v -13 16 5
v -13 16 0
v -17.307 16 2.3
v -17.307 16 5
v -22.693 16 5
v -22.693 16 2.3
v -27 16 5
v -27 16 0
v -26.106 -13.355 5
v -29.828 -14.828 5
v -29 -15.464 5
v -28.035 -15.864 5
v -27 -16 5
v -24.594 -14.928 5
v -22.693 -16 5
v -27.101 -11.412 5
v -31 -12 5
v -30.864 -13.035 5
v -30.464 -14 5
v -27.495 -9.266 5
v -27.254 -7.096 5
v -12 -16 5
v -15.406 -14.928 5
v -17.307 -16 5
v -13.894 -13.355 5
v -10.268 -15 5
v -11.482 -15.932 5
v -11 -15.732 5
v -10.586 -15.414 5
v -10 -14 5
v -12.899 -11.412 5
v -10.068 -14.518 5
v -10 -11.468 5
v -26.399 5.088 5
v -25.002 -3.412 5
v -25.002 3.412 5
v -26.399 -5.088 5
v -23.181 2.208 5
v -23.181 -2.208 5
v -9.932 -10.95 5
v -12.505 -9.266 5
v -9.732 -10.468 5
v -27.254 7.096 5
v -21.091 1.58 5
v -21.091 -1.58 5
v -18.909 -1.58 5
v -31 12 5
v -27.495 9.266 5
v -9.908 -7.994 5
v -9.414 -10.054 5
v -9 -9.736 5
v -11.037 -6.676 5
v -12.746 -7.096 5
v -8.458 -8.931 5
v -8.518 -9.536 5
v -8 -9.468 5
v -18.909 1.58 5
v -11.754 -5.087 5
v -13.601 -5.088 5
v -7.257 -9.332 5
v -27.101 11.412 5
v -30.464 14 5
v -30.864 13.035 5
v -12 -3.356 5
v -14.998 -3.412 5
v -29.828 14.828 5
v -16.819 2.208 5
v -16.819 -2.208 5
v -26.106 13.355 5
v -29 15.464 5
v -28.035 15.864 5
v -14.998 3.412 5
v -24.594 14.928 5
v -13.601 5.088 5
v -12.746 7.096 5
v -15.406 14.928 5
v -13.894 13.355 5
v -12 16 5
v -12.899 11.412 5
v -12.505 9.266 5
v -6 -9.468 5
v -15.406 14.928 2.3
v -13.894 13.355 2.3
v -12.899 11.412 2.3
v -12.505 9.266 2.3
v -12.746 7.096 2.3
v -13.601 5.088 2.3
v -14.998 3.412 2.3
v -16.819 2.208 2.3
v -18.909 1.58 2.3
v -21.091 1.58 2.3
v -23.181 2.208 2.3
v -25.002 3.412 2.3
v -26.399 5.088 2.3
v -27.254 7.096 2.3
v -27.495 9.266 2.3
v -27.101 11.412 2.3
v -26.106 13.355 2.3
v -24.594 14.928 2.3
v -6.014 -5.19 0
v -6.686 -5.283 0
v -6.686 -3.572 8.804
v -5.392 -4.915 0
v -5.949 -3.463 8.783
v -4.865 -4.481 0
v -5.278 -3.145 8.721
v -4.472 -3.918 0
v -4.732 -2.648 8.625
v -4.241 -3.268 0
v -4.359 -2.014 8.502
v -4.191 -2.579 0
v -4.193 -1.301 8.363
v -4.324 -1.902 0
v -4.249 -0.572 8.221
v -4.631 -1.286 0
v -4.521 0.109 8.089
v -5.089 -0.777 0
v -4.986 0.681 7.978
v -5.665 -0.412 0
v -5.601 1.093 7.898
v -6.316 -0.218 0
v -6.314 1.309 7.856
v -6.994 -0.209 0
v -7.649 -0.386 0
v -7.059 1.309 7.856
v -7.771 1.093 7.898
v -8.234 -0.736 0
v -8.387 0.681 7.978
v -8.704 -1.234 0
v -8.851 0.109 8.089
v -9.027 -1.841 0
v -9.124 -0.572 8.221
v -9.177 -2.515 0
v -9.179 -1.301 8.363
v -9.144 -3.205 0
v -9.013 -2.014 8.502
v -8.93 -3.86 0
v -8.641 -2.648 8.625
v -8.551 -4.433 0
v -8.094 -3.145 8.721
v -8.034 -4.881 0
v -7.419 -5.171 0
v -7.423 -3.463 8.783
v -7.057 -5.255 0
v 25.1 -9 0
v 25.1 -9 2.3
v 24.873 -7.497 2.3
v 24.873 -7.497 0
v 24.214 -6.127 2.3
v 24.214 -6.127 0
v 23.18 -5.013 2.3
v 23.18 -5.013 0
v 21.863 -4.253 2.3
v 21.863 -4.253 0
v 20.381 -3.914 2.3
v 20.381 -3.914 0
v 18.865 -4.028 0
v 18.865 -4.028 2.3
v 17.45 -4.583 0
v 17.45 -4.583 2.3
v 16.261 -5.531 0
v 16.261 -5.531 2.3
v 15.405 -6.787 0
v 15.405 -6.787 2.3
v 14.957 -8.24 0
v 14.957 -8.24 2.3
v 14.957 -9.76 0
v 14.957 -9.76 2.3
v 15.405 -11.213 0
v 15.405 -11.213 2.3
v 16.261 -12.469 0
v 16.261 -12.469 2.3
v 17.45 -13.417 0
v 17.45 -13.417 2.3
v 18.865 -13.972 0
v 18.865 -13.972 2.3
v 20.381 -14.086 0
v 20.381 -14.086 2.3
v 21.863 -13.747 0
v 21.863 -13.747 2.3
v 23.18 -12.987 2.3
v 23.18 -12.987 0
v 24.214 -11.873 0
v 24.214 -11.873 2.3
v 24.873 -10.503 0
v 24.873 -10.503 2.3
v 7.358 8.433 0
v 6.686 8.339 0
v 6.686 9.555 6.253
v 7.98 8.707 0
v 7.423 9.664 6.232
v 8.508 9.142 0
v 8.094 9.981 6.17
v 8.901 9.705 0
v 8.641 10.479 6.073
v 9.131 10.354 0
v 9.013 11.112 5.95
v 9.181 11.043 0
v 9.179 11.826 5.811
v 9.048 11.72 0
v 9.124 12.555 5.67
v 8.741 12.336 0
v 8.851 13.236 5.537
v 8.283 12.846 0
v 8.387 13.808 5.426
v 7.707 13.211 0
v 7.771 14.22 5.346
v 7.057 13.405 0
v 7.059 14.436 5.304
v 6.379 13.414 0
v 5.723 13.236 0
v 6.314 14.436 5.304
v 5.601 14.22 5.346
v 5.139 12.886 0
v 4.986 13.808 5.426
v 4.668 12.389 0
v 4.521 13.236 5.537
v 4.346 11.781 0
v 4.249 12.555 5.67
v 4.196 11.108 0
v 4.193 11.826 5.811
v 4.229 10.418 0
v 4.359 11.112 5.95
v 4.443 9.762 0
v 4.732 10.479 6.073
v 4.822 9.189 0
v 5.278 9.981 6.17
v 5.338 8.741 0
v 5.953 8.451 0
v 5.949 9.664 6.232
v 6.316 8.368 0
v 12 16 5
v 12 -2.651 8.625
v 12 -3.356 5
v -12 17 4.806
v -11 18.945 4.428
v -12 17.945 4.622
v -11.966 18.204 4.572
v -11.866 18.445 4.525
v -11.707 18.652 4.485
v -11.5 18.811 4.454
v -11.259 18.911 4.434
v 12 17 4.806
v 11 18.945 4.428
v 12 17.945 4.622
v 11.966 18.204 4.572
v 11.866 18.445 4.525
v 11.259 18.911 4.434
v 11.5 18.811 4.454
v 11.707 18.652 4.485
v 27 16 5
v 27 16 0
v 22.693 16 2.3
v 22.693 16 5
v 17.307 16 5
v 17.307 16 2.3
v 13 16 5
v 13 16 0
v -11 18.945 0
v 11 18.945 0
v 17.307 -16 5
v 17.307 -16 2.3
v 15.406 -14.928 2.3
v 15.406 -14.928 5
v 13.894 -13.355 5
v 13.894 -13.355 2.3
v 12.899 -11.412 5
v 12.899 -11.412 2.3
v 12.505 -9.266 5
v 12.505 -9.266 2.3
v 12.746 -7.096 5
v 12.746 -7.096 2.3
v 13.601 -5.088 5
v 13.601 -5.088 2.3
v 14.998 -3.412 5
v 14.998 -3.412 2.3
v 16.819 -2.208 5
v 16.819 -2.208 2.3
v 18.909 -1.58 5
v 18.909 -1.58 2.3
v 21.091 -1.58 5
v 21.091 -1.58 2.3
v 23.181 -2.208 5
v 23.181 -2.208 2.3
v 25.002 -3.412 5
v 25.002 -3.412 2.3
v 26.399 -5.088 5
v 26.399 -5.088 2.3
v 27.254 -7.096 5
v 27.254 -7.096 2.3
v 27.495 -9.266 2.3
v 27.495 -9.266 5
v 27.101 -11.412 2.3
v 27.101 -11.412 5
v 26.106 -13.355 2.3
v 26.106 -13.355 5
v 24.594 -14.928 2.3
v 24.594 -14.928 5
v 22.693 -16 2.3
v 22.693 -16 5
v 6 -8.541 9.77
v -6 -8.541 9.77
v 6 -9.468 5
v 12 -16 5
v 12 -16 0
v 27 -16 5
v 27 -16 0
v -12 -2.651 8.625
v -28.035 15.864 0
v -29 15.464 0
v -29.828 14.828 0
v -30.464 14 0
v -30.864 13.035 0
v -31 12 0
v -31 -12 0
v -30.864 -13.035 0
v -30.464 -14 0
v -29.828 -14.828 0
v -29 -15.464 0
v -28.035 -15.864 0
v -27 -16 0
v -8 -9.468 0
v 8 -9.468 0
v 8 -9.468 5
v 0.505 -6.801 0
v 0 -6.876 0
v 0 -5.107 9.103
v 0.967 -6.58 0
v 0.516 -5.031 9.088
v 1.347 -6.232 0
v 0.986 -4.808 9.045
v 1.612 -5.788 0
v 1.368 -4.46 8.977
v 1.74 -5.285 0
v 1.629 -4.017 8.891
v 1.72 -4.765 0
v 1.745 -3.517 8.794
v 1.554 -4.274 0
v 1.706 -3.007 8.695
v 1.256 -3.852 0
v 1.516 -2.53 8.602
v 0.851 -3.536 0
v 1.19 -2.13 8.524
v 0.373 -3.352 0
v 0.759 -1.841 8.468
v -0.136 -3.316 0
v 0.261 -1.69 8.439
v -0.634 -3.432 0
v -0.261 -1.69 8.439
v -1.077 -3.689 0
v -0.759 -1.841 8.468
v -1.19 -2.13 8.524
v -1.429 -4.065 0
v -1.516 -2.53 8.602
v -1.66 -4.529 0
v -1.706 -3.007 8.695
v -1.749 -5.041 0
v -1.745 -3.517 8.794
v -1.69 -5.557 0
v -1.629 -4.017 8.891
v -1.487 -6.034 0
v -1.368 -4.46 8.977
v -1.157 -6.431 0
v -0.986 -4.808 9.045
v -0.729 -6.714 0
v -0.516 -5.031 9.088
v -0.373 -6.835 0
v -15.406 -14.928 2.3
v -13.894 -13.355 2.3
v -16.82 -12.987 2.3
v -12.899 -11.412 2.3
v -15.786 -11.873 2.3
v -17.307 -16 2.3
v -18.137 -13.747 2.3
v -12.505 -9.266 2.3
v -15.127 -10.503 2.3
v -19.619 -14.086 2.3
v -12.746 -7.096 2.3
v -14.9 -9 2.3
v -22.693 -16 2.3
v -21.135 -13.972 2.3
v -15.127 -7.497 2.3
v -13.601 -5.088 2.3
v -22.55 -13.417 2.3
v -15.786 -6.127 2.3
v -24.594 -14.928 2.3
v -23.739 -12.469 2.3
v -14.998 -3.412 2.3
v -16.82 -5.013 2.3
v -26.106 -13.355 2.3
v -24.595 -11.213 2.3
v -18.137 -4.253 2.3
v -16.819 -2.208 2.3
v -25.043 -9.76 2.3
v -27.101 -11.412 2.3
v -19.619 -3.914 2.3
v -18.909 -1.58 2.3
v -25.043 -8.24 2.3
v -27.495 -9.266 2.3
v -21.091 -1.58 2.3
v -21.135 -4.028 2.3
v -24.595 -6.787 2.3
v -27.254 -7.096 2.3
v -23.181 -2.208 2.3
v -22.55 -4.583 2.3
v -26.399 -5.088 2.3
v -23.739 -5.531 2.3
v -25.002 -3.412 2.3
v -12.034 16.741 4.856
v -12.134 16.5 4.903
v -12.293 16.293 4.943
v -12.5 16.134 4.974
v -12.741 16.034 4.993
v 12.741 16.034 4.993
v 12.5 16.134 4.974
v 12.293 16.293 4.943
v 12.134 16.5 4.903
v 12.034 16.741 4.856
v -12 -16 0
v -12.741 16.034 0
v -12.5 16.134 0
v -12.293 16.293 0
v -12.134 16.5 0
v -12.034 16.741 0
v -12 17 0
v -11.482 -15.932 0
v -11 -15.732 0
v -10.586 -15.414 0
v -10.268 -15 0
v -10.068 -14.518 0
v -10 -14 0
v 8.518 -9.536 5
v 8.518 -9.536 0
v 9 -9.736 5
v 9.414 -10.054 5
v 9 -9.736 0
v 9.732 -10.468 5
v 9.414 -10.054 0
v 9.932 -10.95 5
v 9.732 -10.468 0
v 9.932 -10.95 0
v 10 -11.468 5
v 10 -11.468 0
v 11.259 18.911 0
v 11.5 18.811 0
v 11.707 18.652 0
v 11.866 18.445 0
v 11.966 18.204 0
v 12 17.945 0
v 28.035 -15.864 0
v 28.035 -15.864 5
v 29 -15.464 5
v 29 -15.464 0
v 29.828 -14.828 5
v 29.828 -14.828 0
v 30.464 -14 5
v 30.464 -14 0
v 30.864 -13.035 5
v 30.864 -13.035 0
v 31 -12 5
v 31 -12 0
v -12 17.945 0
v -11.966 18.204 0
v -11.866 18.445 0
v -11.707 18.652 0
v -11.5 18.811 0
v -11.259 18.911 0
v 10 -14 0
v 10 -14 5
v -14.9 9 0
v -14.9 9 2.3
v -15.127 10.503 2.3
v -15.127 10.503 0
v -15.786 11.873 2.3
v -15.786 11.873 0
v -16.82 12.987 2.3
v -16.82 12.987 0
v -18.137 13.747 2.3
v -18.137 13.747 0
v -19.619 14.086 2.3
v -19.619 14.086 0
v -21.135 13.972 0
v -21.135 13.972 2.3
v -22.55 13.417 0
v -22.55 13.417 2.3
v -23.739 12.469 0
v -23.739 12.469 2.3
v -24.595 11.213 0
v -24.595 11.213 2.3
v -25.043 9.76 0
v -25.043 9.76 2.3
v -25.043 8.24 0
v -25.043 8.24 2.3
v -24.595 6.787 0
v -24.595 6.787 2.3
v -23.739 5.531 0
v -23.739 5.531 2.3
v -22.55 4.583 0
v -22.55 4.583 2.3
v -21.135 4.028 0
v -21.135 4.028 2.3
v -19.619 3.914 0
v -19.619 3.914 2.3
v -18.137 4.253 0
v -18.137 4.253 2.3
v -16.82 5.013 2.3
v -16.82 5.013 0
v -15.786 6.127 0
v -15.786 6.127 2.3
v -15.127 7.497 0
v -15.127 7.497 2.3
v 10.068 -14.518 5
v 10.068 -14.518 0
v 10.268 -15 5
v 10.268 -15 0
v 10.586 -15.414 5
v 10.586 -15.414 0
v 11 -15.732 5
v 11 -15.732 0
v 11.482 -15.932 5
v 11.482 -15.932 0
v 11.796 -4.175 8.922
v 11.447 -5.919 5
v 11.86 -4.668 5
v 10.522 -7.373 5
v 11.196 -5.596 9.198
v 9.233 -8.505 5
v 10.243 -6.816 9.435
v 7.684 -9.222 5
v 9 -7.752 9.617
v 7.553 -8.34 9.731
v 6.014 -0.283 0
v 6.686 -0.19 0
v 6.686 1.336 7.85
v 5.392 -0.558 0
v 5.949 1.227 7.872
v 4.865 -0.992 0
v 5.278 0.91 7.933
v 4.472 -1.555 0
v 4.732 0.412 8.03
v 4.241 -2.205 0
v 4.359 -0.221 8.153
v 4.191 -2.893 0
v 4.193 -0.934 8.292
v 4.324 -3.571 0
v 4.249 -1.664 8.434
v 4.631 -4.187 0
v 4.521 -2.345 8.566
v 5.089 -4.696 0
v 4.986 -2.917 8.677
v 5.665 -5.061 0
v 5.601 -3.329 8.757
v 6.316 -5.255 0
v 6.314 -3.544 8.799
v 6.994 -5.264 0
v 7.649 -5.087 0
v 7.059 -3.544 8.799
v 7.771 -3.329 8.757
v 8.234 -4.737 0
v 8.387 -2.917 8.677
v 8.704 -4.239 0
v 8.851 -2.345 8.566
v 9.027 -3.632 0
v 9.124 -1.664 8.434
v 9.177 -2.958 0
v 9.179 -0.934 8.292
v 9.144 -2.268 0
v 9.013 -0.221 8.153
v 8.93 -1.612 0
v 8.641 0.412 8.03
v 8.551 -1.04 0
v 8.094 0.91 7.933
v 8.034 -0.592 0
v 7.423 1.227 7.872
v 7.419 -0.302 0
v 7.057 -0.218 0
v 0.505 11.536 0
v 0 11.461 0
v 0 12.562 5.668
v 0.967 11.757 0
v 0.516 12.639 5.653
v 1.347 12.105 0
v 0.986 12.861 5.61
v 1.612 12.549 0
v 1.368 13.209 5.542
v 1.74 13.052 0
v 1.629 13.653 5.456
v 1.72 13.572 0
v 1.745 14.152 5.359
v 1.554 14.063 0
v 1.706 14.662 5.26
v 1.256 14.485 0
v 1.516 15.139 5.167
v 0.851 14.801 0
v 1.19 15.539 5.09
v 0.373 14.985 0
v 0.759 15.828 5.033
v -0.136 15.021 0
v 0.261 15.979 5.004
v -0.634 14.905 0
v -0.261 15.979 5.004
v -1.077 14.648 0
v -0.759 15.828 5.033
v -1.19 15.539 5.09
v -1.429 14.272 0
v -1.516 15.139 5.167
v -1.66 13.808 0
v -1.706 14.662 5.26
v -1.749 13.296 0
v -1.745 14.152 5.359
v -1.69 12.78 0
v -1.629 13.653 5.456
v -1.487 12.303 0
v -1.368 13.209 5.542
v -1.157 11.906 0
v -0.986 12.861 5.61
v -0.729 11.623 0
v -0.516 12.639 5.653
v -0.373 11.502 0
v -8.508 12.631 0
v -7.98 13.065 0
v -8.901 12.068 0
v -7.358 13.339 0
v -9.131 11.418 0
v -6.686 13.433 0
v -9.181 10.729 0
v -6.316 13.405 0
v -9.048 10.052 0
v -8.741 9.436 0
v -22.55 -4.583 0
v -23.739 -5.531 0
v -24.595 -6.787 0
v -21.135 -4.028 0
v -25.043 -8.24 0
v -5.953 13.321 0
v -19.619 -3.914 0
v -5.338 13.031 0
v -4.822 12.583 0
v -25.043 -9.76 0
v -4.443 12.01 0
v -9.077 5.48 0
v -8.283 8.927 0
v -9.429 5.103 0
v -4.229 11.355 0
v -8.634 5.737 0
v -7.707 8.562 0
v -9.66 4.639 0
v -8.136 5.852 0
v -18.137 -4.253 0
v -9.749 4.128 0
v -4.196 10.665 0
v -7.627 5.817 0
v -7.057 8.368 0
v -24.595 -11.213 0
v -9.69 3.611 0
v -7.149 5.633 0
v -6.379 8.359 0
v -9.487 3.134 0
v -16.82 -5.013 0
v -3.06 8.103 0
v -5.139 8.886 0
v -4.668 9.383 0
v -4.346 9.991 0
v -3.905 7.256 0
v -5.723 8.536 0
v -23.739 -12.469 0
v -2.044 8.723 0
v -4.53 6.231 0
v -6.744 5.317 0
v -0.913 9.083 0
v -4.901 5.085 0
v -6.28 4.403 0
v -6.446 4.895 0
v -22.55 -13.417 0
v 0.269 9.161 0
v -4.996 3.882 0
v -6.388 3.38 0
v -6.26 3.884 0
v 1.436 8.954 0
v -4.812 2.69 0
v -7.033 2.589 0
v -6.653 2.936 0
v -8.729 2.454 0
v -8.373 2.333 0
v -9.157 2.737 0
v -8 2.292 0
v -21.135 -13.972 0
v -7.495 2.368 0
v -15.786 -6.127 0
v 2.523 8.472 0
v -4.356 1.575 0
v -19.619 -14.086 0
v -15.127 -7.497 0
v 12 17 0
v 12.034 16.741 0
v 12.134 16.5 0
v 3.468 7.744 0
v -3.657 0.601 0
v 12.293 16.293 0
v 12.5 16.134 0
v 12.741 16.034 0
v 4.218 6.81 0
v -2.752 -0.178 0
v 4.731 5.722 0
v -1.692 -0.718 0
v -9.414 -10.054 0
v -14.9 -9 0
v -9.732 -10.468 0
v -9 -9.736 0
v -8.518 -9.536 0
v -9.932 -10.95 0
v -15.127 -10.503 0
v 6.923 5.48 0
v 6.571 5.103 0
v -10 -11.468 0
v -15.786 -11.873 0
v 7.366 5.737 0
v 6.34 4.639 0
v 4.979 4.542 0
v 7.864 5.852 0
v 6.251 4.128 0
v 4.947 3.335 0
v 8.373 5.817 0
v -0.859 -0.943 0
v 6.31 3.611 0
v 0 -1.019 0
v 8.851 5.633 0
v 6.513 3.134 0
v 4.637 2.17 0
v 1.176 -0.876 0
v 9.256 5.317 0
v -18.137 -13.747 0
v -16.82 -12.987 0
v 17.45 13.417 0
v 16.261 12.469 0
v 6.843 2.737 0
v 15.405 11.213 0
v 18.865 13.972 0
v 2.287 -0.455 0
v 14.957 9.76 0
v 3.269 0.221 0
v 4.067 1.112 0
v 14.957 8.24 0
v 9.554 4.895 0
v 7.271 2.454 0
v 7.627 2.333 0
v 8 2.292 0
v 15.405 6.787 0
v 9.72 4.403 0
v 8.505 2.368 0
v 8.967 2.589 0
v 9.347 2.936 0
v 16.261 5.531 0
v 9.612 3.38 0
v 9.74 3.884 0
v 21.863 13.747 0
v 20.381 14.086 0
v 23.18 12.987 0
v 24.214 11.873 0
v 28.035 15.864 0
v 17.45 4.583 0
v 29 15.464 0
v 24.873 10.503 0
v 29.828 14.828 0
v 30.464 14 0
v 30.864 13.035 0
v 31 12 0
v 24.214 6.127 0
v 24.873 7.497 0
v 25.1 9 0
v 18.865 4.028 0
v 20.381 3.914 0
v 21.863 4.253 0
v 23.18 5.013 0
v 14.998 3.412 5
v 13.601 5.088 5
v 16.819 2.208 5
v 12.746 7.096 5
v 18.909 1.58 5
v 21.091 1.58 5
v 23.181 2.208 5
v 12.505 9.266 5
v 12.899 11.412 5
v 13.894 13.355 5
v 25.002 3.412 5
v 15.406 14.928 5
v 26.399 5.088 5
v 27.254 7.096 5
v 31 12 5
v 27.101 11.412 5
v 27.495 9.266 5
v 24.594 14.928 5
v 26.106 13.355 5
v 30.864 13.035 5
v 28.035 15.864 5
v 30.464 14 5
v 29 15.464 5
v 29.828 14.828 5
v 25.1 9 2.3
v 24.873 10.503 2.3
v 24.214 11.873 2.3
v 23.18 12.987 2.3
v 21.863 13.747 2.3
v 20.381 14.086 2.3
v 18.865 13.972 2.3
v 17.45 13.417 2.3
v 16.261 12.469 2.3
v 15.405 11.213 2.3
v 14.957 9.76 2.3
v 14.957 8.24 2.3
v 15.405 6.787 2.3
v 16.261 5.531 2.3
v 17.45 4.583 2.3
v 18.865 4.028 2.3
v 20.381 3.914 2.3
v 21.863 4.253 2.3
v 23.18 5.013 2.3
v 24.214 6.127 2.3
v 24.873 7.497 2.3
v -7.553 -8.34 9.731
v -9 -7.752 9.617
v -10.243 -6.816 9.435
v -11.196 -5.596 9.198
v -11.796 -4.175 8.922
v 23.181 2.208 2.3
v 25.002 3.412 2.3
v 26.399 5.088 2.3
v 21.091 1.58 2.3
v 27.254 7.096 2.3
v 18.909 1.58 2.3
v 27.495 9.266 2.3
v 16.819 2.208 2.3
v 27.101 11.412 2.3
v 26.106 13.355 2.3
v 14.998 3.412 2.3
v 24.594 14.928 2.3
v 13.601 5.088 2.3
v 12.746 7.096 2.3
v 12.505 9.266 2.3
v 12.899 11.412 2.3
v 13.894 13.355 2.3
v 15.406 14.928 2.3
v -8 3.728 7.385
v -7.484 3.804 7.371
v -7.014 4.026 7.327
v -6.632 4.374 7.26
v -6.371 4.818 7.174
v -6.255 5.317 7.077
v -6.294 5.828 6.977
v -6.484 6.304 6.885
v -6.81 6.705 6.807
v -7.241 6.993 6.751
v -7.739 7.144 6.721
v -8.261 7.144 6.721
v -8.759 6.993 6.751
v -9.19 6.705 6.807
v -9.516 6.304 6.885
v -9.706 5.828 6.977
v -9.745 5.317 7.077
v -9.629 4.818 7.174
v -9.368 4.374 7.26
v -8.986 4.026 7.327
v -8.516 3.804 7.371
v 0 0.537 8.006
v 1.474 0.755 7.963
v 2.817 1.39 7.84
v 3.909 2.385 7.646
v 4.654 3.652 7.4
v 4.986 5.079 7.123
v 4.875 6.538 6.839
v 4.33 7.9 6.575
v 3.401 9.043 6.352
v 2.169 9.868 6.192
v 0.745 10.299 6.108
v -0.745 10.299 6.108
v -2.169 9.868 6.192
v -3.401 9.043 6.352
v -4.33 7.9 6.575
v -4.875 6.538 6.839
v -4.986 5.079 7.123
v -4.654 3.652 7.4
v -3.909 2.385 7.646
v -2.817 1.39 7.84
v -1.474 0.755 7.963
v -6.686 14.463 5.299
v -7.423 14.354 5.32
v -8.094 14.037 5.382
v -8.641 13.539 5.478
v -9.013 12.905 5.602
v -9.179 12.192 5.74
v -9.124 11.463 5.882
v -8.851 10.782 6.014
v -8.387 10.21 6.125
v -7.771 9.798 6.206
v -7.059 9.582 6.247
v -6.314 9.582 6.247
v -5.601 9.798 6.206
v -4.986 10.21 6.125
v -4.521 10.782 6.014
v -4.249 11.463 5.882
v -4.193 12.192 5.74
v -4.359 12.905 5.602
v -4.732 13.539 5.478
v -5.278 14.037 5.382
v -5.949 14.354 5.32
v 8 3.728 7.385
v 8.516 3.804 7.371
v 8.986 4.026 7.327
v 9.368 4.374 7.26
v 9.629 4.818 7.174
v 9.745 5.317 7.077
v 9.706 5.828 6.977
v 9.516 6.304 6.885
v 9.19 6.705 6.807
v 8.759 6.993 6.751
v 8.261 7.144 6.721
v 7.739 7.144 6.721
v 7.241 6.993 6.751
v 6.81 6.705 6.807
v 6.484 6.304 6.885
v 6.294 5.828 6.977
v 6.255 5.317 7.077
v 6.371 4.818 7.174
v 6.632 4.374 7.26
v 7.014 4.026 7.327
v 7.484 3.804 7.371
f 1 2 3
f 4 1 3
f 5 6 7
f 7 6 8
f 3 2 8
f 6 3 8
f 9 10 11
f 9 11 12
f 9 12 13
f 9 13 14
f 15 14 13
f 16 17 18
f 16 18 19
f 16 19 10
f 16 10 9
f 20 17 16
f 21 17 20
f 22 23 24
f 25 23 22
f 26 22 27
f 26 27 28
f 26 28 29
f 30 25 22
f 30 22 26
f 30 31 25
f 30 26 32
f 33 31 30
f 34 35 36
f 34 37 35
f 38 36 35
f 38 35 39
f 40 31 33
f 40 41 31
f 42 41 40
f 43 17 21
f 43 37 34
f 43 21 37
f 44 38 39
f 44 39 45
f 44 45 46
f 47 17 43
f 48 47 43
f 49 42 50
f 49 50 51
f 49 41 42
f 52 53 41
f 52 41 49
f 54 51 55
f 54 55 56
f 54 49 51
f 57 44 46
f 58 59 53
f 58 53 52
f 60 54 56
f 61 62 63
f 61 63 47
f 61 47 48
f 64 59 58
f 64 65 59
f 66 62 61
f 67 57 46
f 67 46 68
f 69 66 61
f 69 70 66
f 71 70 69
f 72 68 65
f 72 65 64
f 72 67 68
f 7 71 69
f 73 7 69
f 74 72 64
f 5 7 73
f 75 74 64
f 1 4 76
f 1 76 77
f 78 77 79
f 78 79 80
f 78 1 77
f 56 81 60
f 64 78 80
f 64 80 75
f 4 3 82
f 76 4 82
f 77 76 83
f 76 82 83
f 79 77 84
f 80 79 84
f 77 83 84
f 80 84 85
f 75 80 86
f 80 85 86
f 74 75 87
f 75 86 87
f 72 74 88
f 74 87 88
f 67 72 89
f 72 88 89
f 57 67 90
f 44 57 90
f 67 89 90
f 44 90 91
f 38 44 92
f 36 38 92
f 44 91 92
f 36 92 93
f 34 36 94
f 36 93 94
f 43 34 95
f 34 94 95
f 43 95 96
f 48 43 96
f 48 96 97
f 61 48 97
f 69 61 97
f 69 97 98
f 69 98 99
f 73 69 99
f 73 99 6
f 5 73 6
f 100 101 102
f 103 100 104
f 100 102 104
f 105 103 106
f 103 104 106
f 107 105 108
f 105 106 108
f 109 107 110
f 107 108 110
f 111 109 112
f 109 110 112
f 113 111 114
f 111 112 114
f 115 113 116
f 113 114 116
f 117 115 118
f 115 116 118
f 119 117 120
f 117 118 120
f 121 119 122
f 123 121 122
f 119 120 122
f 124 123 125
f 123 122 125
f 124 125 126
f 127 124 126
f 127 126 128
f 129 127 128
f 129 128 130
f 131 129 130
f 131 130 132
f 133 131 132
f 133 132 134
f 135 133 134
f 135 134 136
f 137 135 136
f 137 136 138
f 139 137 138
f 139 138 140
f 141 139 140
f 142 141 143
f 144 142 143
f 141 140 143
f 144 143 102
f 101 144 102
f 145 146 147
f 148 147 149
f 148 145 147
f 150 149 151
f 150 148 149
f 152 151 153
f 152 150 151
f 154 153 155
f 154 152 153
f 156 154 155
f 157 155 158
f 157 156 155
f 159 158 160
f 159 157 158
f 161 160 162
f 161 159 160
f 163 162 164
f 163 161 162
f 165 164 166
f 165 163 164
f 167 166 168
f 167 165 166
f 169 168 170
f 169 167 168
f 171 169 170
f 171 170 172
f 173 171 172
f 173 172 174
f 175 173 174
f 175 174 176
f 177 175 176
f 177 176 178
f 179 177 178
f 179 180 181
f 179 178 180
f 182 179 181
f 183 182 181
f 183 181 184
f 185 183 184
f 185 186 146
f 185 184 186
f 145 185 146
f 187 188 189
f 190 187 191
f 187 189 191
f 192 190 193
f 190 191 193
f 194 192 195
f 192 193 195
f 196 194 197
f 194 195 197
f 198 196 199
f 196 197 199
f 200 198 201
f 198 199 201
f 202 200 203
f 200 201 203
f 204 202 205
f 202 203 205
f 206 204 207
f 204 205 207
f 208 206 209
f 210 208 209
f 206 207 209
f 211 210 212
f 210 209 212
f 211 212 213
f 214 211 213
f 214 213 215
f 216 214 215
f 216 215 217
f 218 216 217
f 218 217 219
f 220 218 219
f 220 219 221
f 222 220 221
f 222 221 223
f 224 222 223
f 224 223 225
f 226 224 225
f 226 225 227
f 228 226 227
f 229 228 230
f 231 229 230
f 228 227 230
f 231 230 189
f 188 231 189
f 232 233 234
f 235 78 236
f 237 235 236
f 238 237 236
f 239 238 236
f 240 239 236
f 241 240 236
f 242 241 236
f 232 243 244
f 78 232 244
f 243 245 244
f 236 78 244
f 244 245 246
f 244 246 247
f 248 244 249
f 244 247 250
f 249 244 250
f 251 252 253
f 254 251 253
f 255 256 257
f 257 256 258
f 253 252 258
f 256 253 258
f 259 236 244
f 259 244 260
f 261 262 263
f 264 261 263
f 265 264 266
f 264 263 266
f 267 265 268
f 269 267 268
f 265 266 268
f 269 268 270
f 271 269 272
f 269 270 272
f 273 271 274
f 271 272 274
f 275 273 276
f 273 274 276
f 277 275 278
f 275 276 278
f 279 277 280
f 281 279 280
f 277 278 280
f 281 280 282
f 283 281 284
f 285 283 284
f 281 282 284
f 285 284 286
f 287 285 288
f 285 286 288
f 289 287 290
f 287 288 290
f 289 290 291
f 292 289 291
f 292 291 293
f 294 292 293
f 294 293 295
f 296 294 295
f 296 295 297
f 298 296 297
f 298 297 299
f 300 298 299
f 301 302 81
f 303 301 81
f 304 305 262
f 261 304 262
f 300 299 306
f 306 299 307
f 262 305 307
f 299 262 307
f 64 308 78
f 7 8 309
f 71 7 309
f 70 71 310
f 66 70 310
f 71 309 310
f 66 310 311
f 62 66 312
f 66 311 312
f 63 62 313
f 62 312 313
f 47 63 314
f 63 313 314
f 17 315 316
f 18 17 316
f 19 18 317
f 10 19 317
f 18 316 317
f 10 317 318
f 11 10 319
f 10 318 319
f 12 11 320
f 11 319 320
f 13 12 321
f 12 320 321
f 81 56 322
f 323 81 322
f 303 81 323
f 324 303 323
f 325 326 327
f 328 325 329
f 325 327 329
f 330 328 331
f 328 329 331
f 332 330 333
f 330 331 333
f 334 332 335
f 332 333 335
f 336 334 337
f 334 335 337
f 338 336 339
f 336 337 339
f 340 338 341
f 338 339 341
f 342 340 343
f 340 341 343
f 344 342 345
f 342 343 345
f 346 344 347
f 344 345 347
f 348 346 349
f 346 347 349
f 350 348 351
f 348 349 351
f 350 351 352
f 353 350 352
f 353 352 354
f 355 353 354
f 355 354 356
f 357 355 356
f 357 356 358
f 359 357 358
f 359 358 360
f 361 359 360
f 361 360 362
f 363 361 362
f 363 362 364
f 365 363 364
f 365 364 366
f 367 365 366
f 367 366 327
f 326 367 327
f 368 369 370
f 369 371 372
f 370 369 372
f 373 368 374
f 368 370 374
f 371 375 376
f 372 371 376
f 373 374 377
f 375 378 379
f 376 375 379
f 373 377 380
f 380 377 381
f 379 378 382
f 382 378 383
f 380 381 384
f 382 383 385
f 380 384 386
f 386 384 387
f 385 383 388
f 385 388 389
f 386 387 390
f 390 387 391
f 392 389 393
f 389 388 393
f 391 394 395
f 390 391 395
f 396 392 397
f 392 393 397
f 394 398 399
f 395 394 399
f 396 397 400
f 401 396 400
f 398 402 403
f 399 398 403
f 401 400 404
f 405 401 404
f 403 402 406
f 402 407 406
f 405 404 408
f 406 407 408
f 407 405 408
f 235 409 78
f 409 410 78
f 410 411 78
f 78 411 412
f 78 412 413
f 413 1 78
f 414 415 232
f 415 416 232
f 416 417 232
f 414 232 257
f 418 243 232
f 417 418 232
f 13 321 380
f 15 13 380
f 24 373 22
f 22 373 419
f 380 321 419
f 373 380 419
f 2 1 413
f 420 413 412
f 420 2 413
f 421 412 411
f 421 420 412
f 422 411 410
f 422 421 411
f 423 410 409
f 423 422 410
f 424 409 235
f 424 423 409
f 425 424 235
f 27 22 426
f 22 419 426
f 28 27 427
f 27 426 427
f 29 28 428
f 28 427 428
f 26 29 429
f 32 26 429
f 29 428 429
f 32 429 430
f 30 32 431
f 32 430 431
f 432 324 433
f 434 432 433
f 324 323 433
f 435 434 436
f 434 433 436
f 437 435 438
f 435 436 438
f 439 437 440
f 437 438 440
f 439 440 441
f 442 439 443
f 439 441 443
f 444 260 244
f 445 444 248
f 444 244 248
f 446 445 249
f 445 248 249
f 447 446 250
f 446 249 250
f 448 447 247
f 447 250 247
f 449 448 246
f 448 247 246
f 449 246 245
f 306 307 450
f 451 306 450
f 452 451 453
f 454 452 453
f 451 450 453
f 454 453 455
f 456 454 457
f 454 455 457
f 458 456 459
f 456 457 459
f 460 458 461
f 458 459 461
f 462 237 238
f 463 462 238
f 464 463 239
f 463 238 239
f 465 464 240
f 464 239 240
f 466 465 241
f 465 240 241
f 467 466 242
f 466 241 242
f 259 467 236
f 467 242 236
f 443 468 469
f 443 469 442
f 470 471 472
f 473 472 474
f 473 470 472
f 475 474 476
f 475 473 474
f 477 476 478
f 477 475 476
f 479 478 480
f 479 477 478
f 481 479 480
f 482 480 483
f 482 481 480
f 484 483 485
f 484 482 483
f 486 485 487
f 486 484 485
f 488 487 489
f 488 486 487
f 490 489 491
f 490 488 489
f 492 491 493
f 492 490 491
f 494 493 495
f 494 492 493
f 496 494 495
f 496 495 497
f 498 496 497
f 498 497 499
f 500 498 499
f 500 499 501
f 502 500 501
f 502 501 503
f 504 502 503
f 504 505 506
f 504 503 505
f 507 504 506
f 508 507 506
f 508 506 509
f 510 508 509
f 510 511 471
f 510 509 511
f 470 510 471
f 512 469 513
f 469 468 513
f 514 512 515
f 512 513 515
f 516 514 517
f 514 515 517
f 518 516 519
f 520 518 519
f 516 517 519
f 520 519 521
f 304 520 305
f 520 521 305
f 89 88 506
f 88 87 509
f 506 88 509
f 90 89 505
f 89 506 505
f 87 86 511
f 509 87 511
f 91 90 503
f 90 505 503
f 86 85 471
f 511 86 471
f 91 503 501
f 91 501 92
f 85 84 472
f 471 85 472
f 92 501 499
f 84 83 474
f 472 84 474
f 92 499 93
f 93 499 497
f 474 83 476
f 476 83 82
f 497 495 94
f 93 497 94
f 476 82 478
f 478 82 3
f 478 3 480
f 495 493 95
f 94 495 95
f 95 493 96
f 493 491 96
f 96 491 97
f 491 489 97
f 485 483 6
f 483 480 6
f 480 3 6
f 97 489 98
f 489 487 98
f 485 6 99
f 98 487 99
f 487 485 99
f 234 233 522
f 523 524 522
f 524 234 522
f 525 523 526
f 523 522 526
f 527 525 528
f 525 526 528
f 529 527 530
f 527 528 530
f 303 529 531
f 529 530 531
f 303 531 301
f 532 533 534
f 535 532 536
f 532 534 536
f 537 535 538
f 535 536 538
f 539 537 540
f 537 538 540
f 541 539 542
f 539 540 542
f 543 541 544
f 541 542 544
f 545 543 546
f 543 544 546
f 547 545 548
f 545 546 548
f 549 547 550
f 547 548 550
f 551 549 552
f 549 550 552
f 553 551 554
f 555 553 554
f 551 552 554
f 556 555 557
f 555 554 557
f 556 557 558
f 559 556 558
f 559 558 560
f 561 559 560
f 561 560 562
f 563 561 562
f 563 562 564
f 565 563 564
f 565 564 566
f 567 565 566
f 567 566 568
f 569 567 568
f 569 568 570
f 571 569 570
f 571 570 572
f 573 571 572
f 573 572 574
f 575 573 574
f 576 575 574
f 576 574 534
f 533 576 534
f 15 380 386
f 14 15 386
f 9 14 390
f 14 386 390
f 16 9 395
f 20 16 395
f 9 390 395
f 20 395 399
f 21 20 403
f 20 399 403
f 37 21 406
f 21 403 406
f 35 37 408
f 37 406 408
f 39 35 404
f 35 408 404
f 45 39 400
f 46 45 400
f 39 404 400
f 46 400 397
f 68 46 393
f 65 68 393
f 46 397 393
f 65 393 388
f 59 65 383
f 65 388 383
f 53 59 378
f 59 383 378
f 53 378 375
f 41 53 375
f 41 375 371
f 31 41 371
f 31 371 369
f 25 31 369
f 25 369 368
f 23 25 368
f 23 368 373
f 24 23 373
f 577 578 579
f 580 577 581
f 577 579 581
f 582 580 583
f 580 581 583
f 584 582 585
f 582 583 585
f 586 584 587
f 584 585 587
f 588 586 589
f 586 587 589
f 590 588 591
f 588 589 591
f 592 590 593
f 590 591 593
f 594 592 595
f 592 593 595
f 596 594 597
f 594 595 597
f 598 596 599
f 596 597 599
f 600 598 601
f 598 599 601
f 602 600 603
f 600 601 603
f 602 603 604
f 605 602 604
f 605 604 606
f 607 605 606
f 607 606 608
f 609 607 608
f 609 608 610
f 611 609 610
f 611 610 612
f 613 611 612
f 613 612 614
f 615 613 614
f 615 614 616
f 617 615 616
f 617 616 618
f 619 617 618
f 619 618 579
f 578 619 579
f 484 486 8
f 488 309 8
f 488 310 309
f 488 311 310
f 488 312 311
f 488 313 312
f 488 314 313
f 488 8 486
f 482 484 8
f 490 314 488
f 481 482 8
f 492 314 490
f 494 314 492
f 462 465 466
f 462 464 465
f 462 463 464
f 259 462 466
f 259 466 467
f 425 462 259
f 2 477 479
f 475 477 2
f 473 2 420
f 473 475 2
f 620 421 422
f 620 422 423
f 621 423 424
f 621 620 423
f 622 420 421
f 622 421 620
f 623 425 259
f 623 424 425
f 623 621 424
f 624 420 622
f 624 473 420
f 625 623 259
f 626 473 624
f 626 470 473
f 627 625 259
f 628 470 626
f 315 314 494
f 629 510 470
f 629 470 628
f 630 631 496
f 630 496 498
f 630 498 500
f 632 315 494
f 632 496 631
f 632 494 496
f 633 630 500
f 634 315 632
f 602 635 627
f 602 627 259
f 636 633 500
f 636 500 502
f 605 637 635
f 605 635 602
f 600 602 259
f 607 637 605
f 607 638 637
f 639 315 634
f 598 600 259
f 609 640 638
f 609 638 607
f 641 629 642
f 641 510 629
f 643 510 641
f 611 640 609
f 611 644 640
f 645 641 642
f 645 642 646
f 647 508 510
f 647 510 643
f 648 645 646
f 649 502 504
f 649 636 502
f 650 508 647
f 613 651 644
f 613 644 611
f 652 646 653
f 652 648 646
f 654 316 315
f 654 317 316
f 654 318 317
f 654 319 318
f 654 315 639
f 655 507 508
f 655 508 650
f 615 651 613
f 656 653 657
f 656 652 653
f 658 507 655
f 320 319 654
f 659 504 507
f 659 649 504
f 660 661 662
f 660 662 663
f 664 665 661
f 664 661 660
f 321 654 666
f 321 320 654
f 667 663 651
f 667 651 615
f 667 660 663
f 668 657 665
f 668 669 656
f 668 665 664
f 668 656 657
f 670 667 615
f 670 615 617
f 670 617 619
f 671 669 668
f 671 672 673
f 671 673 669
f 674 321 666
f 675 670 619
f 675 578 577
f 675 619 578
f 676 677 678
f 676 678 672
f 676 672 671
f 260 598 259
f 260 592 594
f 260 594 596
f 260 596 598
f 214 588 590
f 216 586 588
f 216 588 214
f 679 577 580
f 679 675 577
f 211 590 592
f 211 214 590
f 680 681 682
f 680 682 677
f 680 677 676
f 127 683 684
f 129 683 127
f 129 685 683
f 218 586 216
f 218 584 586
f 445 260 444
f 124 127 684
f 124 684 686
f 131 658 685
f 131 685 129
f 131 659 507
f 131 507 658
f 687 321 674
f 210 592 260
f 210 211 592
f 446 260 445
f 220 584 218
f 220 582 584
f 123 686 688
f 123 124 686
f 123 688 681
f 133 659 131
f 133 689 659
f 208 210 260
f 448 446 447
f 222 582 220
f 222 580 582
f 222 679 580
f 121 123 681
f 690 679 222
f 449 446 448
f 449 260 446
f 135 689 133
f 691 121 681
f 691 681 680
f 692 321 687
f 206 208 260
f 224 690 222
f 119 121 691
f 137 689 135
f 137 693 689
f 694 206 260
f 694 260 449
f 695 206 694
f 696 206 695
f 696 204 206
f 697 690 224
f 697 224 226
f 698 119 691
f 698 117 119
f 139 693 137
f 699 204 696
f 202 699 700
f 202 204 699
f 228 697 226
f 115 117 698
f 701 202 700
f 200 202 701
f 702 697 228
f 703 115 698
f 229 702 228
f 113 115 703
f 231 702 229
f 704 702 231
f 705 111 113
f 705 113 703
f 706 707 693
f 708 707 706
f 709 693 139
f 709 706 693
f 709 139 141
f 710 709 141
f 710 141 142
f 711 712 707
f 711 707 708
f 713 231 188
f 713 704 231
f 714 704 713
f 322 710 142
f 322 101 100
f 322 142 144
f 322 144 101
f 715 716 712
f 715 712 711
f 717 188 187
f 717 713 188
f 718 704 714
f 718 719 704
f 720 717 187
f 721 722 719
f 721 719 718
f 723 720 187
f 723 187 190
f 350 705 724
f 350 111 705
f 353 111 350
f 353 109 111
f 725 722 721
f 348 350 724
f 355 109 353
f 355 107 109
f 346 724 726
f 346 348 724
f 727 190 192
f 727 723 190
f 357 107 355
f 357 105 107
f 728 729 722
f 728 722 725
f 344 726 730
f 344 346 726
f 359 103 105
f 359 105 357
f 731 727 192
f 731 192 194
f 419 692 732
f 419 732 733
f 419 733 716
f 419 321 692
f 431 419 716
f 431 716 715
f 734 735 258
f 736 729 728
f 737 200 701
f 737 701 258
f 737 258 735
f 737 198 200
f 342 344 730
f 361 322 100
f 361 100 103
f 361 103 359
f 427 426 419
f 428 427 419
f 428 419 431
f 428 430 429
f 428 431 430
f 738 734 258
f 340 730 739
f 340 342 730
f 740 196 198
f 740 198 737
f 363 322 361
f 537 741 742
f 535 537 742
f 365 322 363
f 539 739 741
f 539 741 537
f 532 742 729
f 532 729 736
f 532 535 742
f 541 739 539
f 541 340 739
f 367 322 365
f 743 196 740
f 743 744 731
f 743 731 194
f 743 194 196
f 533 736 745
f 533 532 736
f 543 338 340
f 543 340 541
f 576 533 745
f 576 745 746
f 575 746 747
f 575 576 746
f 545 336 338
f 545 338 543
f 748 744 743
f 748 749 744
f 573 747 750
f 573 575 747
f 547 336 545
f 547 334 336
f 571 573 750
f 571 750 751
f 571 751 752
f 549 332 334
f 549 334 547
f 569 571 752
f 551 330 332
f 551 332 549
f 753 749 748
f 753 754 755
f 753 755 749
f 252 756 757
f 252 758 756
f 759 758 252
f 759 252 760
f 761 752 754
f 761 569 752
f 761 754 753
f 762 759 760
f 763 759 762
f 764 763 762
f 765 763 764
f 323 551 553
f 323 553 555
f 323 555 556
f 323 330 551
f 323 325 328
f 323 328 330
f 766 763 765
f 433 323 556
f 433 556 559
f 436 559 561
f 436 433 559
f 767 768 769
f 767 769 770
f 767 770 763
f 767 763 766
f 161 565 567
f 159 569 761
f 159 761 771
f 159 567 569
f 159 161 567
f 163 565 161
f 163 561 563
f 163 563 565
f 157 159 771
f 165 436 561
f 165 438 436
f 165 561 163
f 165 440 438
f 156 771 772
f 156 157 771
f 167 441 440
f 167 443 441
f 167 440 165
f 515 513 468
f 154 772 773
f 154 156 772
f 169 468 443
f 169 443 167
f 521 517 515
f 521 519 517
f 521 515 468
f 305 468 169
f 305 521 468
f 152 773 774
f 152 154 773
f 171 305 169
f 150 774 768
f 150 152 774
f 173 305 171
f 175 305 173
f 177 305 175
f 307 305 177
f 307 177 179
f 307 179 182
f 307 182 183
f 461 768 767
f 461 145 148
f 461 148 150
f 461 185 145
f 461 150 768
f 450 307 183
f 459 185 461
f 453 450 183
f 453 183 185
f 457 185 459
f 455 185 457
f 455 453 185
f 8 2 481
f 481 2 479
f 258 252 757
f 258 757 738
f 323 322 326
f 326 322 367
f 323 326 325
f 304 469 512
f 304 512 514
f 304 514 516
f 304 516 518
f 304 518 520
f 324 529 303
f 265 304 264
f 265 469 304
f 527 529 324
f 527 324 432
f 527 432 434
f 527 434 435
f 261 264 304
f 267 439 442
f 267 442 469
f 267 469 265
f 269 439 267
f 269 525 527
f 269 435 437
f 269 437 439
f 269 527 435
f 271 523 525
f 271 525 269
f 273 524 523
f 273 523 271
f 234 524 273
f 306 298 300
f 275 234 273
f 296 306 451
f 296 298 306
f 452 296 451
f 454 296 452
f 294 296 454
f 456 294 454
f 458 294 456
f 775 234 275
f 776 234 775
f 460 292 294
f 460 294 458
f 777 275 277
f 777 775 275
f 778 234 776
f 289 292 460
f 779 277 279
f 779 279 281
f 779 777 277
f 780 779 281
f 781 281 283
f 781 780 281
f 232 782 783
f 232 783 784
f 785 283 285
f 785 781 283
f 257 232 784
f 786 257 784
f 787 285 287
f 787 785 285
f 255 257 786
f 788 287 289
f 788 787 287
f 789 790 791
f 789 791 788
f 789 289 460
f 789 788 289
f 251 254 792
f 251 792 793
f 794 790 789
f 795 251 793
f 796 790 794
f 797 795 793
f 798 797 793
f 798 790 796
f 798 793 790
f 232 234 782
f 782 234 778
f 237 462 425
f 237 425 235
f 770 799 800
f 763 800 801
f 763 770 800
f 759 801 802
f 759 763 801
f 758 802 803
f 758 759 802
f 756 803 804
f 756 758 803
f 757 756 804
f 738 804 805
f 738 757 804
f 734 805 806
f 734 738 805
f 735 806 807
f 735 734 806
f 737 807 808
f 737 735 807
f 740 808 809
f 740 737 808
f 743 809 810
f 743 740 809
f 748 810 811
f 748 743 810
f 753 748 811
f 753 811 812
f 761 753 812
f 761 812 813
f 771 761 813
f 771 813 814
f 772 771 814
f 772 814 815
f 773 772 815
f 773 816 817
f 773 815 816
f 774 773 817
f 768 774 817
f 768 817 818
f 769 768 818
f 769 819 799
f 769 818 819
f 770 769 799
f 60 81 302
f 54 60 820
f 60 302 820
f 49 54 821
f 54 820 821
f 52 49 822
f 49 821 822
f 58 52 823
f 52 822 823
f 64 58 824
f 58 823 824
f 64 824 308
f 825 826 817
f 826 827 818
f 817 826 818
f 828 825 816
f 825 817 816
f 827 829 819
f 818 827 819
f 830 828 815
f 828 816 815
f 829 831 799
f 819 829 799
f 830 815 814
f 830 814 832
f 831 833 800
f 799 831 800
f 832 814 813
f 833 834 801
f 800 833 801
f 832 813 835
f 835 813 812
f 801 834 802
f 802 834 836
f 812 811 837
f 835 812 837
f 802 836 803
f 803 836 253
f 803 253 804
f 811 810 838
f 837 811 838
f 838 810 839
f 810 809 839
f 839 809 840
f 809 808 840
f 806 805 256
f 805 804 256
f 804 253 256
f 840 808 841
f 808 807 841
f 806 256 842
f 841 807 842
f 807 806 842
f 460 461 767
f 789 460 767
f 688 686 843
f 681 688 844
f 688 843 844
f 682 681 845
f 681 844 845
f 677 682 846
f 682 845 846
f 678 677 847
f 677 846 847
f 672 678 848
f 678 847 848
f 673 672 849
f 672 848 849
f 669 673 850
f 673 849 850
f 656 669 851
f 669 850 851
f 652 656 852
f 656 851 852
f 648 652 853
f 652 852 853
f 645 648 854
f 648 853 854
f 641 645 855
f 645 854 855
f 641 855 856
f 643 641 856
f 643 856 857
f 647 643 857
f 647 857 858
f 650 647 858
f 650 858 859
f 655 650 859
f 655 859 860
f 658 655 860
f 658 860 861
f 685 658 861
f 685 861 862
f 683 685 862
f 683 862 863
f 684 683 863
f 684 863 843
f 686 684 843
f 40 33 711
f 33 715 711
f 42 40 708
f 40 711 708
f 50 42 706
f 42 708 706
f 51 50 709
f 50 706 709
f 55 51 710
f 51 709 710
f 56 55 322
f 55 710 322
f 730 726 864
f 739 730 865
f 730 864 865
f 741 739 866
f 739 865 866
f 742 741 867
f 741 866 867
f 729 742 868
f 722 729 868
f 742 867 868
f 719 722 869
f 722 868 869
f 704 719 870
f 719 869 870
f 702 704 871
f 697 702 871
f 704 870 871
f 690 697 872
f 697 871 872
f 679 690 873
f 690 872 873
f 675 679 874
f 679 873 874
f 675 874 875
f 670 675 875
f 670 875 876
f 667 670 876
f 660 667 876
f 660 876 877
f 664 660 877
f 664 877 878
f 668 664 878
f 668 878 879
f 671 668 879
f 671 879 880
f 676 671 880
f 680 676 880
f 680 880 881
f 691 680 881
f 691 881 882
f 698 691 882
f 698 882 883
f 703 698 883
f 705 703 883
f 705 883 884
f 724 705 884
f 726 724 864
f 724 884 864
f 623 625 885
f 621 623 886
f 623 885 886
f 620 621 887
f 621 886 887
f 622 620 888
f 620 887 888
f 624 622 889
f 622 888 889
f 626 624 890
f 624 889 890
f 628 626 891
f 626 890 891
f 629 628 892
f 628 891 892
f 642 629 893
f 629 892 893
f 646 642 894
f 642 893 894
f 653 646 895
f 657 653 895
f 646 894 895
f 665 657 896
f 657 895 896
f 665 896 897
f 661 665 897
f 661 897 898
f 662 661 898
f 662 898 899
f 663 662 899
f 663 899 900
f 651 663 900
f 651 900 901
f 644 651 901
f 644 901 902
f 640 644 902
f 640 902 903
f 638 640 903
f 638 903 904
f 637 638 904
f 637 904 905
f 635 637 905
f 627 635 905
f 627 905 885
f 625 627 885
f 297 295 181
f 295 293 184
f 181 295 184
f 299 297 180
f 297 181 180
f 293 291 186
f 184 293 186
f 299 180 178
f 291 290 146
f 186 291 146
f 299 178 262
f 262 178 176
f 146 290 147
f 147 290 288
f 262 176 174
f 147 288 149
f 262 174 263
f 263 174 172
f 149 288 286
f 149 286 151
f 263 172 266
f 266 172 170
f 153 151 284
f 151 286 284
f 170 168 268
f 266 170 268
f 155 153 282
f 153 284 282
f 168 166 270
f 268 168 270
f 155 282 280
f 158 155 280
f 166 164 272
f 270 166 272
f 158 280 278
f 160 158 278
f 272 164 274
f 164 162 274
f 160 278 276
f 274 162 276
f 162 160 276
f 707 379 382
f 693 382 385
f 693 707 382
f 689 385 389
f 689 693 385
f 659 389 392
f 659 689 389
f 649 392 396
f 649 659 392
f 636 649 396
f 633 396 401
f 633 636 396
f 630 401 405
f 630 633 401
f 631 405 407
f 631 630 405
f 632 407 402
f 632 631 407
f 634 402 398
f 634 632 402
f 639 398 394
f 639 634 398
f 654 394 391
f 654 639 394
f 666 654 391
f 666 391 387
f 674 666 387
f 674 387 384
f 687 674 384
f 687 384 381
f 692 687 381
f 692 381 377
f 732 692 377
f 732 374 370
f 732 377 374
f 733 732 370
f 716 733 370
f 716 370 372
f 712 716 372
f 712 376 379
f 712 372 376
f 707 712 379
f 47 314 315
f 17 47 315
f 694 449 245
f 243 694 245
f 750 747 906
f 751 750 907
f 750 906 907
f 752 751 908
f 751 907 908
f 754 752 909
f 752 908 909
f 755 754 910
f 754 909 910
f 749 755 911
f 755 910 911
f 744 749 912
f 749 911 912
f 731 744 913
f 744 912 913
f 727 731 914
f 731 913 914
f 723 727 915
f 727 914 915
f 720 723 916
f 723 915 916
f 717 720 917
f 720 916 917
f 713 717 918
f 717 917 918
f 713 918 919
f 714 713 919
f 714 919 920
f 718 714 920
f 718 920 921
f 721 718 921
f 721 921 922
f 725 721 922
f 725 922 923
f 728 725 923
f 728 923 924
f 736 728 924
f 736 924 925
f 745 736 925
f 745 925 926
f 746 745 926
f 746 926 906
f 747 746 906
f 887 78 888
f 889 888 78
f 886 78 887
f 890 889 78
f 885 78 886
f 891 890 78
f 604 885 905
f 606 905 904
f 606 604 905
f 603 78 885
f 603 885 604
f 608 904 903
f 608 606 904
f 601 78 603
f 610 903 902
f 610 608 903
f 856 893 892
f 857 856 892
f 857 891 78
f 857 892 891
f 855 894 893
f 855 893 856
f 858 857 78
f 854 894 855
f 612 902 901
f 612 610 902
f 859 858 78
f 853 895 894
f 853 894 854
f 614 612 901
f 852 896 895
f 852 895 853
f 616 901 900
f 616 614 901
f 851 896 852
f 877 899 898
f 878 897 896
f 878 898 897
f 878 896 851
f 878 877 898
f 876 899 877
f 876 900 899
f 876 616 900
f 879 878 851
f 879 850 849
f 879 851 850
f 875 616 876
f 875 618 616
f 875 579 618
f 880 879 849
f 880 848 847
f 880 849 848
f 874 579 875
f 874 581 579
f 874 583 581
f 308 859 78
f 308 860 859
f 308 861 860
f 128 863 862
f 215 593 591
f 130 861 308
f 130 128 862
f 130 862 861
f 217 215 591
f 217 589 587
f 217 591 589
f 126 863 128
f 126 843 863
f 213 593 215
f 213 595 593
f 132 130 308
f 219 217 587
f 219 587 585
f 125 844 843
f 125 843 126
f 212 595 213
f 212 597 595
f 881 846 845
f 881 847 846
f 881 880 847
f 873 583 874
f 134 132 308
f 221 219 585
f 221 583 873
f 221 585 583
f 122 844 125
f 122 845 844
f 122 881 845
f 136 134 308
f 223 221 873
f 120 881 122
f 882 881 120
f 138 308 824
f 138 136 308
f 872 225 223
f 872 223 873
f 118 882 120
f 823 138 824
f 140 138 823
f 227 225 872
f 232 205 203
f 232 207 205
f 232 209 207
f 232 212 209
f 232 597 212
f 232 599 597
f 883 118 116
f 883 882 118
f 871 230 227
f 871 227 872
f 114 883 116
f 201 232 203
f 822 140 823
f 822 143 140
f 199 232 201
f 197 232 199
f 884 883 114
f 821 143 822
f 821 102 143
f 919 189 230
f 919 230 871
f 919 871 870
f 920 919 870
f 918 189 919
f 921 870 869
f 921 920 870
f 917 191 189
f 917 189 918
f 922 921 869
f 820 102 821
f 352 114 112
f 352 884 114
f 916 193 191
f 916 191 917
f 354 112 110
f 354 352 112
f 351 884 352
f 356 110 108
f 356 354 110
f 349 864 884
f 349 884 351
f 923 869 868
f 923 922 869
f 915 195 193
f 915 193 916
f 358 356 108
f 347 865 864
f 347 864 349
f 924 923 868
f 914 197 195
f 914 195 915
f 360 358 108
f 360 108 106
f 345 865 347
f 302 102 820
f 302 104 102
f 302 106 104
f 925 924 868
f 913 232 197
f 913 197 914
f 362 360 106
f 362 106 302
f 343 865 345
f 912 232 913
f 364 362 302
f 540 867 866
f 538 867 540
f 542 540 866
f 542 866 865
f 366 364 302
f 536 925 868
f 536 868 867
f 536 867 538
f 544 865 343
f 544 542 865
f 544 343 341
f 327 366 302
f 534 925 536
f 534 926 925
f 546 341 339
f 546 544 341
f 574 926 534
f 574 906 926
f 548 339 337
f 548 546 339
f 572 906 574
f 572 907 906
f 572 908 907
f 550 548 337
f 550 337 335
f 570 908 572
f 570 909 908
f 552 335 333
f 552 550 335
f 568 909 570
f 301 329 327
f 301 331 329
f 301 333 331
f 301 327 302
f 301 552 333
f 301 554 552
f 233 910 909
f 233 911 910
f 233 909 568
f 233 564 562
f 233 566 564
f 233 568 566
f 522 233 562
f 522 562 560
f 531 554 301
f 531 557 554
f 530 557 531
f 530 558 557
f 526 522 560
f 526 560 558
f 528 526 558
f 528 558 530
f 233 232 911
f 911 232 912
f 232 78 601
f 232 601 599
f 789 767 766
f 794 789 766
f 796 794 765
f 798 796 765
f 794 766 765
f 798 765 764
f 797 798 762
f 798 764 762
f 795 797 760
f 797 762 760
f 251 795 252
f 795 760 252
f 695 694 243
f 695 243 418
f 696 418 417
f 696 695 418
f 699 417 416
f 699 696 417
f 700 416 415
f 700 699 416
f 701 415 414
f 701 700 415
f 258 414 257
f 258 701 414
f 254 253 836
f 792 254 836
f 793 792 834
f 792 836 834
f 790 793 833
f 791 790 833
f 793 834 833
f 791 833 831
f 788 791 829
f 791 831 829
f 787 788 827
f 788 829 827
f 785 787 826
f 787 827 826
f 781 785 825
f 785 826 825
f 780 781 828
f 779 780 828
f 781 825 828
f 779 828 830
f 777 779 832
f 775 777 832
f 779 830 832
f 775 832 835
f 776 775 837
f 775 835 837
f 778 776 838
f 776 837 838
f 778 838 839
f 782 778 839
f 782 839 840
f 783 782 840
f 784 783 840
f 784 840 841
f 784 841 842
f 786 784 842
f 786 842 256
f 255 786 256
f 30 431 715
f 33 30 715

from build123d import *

# Parameters (mm, degrees)
SKETCH1_R           = 5.1
BOSS_EXTRUDE1_DEPTH = 5
CUT_EXTRUDE1_START  = -2.3
SKETCH2_R           = 7.5
CUT_EXTRUDE1_DEPTH  = 33.942020373
BOSS_EXTRUDE2_DEPTH = 12
SKETCH4_R           = 5
SKETCH4_R_2         = 1.75
SKETCH4_R_3         = 2.5
CUT_EXTRUDE2_DEPTH  = 37.455291152
FILLET1_R           = 1
SKETCH5_W           = 20
SKETCH5_H           = 6.532082626
CUT_EXTRUDE3_DEPTH  = 37.672994655
FILLET2_R           = 2
FILLET3_R           = 6


with BuildPart() as part:
    # Sketch1 → Boss-Extrude1 (new body)
    with BuildSketch(Plane.XY):
        with BuildLine():
            Line((-27, -16), (27, -16))
            ThreePointArc((27, -16), (29.828427125, -14.828427125), (31, -12))
            Line((31, -12), (31, 12))
            ThreePointArc((31, 12), (29.828427125, 14.828427125), (27, 16))
            Line((27, 16), (-27, 16))
            ThreePointArc((-27, 16), (-29.828427125, 14.828427125), (-31, 12))
            Line((-31, 12), (-31, -12))
            ThreePointArc((-31, -12), (-29.828427125, -14.828427125), (-27, -16))
        make_face()
        with Locations((-20, 9)):
            Circle(SKETCH1_R, mode=Mode.SUBTRACT)
        with Locations((20, -9)):
            Circle(SKETCH1_R, mode=Mode.SUBTRACT)
        with Locations((-20, -9)):
            Circle(SKETCH1_R, mode=Mode.SUBTRACT)
        with Locations((20, 9)):
            Circle(SKETCH1_R, mode=Mode.SUBTRACT)
    extrude(amount=BOSS_EXTRUDE1_DEPTH)

    # Sketch2 → Cut-Extrude1 (cut, through all)
    with BuildSketch(Plane(origin=(0, 0, 0), x_dir=(-1, 0, 0), z_dir=(0, 0, -1)).offset(CUT_EXTRUDE1_START)):
        with Locations((20, 9)):
            Circle(SKETCH2_R)
        with Locations((-20, 9)):
            Circle(SKETCH2_R)
        with Locations((-20, -9)):
            Circle(SKETCH2_R)
        with Locations((20, -9)):
            Circle(SKETCH2_R)
    extrude(amount=-CUT_EXTRUDE1_DEPTH, mode=Mode.SUBTRACT)

    # Sketch3 → Boss-Extrude2 (add, symmetric)
    with BuildSketch(Plane(origin=(0, 0, 0), x_dir=(0, 0, -1), z_dir=(1, 0, 0))):
        Polygon((-5, 16), (-9.770224884, -8.540679586), (-5, -9.467917374), align=None)
        Polygon((0, 16), (-5, 16), (-4.427573014, 18.94488155), (0, 18.94488155), align=None)
    extrude(amount=BOSS_EXTRUDE2_DEPTH, both=True)

    # Sketch4 → Cut-Extrude2 (cut, through all)
    with BuildSketch(Plane(origin=(0, 1.519045647, 7.814812384), x_dir=(1, 0, 0), z_dir=(0, 0.19080899537654522, 0.981627183447664))):
        with Locations(Location((0, 4, 0), (0, 0, 270))):
            Circle(SKETCH4_R)
        with Locations(Location((0, 13, 0), (0, 0, 270))):
            Circle(SKETCH4_R_2)
        with Locations(Location((8, 4, 0), (0, 0, 270))):
            Circle(SKETCH4_R_2)
        with Locations(Location((0, -5, 0), (0, 0, 270))):
            Circle(SKETCH4_R_2)
        with Locations(Location((-8, 4, 0), (0, 0, 270))):
            Circle(SKETCH4_R_2)
        with Locations(Location((-6.686187475, -2.686187475, 0), (0, 0, 270))):
            Circle(SKETCH4_R_3)
        with Locations(Location((6.686187475, -2.686187475, 0), (0, 0, 90))):
            Circle(SKETCH4_R_3)
        with Locations(Location((6.686187475, 10.686187475, 0), (0, 0, 270))):
            Circle(SKETCH4_R_3)
        with Locations(Location((-6.686187475, 10.686187475, 0), (0, 0, 90))):
            Circle(SKETCH4_R_3)
    extrude(amount=-CUT_EXTRUDE2_DEPTH, mode=Mode.SUBTRACT)

    # Fillet1
    # the kernel refuses this fillet: 1 mm, written as the material it adds along each edge
    with BuildSketch(Plane(origin=(12, 16, 0), x_dir=(1, 0, 0), z_dir=(0, 0, 1))) as fillet1_piece_1_section:
        with BuildLine():
            CenterArc((FILLET1_R, FILLET1_R), FILLET1_R, 180, 90)
            Line((0, FILLET1_R), (0, 0))
            Line((0, 0), (FILLET1_R, 0))
        make_face()
    fillet1_piece_1 = extrude(amount=5, mode=Mode.PRIVATE)
    fillet1_piece_1 = split(fillet1_piece_1, bisect_by=Plane(origin=(12.227463764, 16.688764384, 4.866117766), z_dir=(0, -0.19080899537654517, -0.981627183447664)), keep=Keep.TOP, mode=Mode.PRIVATE)
    add(fillet1_piece_1)
    with BuildSketch(Plane(origin=(-12, 16, 0), x_dir=(-1, 0, 0), z_dir=(0, 0, 1))) as fillet1_piece_2_section:
        with BuildLine():
            CenterArc((FILLET1_R, -FILLET1_R), FILLET1_R, 90, 90)
            Line((0, -FILLET1_R), (0, 0))
            Line((0, 0), (FILLET1_R, 0))
        make_face()
    fillet1_piece_2 = extrude(amount=5, mode=Mode.PRIVATE)
    fillet1_piece_2 = split(fillet1_piece_2, bisect_by=Plane(origin=(-12.227463764, 16.688764384, 4.866117766), z_dir=(0, -0.19080899537654517, -0.981627183447664)), keep=Keep.TOP, mode=Mode.PRIVATE)
    add(fillet1_piece_2)
    # the kernel refuses this fillet: 1 mm, written as the material it takes off along each edge
    with BuildSketch(Plane(origin=(12, 18.94488155, 6.927573014), x_dir=(0, -1, 0), z_dir=(0, 0, -1))) as fillet1_2_piece_1:
        with BuildLine():
            CenterArc((FILLET1_R, FILLET1_R), FILLET1_R, 180, 90)
            Line((0, FILLET1_R), (0, 0))
            Line((0, 0), (FILLET1_R, 0))
        make_face()
    extrude(amount=9.427573014, mode=Mode.SUBTRACT)
    with BuildSketch(Plane(origin=(-12, 18.94488155, 6.927573014), x_dir=(0, -1, 0), z_dir=(0, 0, -1))) as fillet1_2_piece_2:
        with BuildLine():
            CenterArc((FILLET1_R, -FILLET1_R), FILLET1_R, 90, 90)
            Line((0, -FILLET1_R), (0, 0))
            Line((0, 0), (FILLET1_R, 0))
        make_face()
    extrude(amount=9.427573014, mode=Mode.SUBTRACT)

    # Sketch5 → Cut-Extrude3 (cut, through all)
    with BuildSketch(Plane.XY.offset(5)):
        with Locations((0, -12.733958687)):
            Rectangle(SKETCH5_W, SKETCH5_H)
    extrude(amount=-CUT_EXTRUDE3_DEPTH, mode=Mode.SUBTRACT)

    # Fillet2
    fillet2_edges = [part.edges().sort_by_distance(p)[0] for p in [
        (-10, -16, 2.5),
        (-10, -9.467917374, 2.5),
        (10, -9.467917374, 2.5),
        (10, -16, 2.5),
    ]]
    fillet(fillet2_edges, radius=FILLET2_R)

    # Fillet3
    # the kernel refuses this fillet: 6 mm, written as the material it takes off along each edge
    with BuildSketch(Plane(origin=(-12, -5.678544656, 24.494632636), x_dir=(1, 0, 0), z_dir=(0, -0.19080899537654505, -0.981627183447664))) as fillet3_piece_1_section:
        with BuildLine():
            CenterArc((FILLET3_R, -FILLET3_R), FILLET3_R, 90, 90)
            Line((0, -FILLET3_R), (0, 0))
            Line((0, 0), (FILLET3_R, 0))
        make_face()
    fillet3_piece_1 = extrude(amount=34.859507728, mode=Mode.PRIVATE)
    fillet3_piece_1 = split(fillet3_piece_1, bisect_by=Plane(origin=(-10.628321285, -7.717365946, 5), z_dir=(0, 0, 1)), keep=Keep.TOP, mode=Mode.PRIVATE)
    add(fillet3_piece_1, mode=Mode.SUBTRACT)
    with BuildSketch(Plane(origin=(12, -5.678544656, 24.494632636), x_dir=(-1, 0, 0), z_dir=(0, -0.19080899537654505, -0.981627183447664))) as fillet3_piece_2_section:
        with BuildLine():
            CenterArc((FILLET3_R, FILLET3_R), FILLET3_R, 180, 90)
            Line((0, FILLET3_R), (0, 0))
            Line((0, 0), (FILLET3_R, 0))
        make_face()
    fillet3_piece_2 = extrude(amount=34.859507728, mode=Mode.PRIVATE)
    fillet3_piece_2 = split(fillet3_piece_2, bisect_by=Plane(origin=(10.628321285, -7.717365946, 5), z_dir=(0, 0, 1)), keep=Keep.TOP, mode=Mode.PRIVATE)
    add(fillet3_piece_2, mode=Mode.SUBTRACT)


solid = part.part
